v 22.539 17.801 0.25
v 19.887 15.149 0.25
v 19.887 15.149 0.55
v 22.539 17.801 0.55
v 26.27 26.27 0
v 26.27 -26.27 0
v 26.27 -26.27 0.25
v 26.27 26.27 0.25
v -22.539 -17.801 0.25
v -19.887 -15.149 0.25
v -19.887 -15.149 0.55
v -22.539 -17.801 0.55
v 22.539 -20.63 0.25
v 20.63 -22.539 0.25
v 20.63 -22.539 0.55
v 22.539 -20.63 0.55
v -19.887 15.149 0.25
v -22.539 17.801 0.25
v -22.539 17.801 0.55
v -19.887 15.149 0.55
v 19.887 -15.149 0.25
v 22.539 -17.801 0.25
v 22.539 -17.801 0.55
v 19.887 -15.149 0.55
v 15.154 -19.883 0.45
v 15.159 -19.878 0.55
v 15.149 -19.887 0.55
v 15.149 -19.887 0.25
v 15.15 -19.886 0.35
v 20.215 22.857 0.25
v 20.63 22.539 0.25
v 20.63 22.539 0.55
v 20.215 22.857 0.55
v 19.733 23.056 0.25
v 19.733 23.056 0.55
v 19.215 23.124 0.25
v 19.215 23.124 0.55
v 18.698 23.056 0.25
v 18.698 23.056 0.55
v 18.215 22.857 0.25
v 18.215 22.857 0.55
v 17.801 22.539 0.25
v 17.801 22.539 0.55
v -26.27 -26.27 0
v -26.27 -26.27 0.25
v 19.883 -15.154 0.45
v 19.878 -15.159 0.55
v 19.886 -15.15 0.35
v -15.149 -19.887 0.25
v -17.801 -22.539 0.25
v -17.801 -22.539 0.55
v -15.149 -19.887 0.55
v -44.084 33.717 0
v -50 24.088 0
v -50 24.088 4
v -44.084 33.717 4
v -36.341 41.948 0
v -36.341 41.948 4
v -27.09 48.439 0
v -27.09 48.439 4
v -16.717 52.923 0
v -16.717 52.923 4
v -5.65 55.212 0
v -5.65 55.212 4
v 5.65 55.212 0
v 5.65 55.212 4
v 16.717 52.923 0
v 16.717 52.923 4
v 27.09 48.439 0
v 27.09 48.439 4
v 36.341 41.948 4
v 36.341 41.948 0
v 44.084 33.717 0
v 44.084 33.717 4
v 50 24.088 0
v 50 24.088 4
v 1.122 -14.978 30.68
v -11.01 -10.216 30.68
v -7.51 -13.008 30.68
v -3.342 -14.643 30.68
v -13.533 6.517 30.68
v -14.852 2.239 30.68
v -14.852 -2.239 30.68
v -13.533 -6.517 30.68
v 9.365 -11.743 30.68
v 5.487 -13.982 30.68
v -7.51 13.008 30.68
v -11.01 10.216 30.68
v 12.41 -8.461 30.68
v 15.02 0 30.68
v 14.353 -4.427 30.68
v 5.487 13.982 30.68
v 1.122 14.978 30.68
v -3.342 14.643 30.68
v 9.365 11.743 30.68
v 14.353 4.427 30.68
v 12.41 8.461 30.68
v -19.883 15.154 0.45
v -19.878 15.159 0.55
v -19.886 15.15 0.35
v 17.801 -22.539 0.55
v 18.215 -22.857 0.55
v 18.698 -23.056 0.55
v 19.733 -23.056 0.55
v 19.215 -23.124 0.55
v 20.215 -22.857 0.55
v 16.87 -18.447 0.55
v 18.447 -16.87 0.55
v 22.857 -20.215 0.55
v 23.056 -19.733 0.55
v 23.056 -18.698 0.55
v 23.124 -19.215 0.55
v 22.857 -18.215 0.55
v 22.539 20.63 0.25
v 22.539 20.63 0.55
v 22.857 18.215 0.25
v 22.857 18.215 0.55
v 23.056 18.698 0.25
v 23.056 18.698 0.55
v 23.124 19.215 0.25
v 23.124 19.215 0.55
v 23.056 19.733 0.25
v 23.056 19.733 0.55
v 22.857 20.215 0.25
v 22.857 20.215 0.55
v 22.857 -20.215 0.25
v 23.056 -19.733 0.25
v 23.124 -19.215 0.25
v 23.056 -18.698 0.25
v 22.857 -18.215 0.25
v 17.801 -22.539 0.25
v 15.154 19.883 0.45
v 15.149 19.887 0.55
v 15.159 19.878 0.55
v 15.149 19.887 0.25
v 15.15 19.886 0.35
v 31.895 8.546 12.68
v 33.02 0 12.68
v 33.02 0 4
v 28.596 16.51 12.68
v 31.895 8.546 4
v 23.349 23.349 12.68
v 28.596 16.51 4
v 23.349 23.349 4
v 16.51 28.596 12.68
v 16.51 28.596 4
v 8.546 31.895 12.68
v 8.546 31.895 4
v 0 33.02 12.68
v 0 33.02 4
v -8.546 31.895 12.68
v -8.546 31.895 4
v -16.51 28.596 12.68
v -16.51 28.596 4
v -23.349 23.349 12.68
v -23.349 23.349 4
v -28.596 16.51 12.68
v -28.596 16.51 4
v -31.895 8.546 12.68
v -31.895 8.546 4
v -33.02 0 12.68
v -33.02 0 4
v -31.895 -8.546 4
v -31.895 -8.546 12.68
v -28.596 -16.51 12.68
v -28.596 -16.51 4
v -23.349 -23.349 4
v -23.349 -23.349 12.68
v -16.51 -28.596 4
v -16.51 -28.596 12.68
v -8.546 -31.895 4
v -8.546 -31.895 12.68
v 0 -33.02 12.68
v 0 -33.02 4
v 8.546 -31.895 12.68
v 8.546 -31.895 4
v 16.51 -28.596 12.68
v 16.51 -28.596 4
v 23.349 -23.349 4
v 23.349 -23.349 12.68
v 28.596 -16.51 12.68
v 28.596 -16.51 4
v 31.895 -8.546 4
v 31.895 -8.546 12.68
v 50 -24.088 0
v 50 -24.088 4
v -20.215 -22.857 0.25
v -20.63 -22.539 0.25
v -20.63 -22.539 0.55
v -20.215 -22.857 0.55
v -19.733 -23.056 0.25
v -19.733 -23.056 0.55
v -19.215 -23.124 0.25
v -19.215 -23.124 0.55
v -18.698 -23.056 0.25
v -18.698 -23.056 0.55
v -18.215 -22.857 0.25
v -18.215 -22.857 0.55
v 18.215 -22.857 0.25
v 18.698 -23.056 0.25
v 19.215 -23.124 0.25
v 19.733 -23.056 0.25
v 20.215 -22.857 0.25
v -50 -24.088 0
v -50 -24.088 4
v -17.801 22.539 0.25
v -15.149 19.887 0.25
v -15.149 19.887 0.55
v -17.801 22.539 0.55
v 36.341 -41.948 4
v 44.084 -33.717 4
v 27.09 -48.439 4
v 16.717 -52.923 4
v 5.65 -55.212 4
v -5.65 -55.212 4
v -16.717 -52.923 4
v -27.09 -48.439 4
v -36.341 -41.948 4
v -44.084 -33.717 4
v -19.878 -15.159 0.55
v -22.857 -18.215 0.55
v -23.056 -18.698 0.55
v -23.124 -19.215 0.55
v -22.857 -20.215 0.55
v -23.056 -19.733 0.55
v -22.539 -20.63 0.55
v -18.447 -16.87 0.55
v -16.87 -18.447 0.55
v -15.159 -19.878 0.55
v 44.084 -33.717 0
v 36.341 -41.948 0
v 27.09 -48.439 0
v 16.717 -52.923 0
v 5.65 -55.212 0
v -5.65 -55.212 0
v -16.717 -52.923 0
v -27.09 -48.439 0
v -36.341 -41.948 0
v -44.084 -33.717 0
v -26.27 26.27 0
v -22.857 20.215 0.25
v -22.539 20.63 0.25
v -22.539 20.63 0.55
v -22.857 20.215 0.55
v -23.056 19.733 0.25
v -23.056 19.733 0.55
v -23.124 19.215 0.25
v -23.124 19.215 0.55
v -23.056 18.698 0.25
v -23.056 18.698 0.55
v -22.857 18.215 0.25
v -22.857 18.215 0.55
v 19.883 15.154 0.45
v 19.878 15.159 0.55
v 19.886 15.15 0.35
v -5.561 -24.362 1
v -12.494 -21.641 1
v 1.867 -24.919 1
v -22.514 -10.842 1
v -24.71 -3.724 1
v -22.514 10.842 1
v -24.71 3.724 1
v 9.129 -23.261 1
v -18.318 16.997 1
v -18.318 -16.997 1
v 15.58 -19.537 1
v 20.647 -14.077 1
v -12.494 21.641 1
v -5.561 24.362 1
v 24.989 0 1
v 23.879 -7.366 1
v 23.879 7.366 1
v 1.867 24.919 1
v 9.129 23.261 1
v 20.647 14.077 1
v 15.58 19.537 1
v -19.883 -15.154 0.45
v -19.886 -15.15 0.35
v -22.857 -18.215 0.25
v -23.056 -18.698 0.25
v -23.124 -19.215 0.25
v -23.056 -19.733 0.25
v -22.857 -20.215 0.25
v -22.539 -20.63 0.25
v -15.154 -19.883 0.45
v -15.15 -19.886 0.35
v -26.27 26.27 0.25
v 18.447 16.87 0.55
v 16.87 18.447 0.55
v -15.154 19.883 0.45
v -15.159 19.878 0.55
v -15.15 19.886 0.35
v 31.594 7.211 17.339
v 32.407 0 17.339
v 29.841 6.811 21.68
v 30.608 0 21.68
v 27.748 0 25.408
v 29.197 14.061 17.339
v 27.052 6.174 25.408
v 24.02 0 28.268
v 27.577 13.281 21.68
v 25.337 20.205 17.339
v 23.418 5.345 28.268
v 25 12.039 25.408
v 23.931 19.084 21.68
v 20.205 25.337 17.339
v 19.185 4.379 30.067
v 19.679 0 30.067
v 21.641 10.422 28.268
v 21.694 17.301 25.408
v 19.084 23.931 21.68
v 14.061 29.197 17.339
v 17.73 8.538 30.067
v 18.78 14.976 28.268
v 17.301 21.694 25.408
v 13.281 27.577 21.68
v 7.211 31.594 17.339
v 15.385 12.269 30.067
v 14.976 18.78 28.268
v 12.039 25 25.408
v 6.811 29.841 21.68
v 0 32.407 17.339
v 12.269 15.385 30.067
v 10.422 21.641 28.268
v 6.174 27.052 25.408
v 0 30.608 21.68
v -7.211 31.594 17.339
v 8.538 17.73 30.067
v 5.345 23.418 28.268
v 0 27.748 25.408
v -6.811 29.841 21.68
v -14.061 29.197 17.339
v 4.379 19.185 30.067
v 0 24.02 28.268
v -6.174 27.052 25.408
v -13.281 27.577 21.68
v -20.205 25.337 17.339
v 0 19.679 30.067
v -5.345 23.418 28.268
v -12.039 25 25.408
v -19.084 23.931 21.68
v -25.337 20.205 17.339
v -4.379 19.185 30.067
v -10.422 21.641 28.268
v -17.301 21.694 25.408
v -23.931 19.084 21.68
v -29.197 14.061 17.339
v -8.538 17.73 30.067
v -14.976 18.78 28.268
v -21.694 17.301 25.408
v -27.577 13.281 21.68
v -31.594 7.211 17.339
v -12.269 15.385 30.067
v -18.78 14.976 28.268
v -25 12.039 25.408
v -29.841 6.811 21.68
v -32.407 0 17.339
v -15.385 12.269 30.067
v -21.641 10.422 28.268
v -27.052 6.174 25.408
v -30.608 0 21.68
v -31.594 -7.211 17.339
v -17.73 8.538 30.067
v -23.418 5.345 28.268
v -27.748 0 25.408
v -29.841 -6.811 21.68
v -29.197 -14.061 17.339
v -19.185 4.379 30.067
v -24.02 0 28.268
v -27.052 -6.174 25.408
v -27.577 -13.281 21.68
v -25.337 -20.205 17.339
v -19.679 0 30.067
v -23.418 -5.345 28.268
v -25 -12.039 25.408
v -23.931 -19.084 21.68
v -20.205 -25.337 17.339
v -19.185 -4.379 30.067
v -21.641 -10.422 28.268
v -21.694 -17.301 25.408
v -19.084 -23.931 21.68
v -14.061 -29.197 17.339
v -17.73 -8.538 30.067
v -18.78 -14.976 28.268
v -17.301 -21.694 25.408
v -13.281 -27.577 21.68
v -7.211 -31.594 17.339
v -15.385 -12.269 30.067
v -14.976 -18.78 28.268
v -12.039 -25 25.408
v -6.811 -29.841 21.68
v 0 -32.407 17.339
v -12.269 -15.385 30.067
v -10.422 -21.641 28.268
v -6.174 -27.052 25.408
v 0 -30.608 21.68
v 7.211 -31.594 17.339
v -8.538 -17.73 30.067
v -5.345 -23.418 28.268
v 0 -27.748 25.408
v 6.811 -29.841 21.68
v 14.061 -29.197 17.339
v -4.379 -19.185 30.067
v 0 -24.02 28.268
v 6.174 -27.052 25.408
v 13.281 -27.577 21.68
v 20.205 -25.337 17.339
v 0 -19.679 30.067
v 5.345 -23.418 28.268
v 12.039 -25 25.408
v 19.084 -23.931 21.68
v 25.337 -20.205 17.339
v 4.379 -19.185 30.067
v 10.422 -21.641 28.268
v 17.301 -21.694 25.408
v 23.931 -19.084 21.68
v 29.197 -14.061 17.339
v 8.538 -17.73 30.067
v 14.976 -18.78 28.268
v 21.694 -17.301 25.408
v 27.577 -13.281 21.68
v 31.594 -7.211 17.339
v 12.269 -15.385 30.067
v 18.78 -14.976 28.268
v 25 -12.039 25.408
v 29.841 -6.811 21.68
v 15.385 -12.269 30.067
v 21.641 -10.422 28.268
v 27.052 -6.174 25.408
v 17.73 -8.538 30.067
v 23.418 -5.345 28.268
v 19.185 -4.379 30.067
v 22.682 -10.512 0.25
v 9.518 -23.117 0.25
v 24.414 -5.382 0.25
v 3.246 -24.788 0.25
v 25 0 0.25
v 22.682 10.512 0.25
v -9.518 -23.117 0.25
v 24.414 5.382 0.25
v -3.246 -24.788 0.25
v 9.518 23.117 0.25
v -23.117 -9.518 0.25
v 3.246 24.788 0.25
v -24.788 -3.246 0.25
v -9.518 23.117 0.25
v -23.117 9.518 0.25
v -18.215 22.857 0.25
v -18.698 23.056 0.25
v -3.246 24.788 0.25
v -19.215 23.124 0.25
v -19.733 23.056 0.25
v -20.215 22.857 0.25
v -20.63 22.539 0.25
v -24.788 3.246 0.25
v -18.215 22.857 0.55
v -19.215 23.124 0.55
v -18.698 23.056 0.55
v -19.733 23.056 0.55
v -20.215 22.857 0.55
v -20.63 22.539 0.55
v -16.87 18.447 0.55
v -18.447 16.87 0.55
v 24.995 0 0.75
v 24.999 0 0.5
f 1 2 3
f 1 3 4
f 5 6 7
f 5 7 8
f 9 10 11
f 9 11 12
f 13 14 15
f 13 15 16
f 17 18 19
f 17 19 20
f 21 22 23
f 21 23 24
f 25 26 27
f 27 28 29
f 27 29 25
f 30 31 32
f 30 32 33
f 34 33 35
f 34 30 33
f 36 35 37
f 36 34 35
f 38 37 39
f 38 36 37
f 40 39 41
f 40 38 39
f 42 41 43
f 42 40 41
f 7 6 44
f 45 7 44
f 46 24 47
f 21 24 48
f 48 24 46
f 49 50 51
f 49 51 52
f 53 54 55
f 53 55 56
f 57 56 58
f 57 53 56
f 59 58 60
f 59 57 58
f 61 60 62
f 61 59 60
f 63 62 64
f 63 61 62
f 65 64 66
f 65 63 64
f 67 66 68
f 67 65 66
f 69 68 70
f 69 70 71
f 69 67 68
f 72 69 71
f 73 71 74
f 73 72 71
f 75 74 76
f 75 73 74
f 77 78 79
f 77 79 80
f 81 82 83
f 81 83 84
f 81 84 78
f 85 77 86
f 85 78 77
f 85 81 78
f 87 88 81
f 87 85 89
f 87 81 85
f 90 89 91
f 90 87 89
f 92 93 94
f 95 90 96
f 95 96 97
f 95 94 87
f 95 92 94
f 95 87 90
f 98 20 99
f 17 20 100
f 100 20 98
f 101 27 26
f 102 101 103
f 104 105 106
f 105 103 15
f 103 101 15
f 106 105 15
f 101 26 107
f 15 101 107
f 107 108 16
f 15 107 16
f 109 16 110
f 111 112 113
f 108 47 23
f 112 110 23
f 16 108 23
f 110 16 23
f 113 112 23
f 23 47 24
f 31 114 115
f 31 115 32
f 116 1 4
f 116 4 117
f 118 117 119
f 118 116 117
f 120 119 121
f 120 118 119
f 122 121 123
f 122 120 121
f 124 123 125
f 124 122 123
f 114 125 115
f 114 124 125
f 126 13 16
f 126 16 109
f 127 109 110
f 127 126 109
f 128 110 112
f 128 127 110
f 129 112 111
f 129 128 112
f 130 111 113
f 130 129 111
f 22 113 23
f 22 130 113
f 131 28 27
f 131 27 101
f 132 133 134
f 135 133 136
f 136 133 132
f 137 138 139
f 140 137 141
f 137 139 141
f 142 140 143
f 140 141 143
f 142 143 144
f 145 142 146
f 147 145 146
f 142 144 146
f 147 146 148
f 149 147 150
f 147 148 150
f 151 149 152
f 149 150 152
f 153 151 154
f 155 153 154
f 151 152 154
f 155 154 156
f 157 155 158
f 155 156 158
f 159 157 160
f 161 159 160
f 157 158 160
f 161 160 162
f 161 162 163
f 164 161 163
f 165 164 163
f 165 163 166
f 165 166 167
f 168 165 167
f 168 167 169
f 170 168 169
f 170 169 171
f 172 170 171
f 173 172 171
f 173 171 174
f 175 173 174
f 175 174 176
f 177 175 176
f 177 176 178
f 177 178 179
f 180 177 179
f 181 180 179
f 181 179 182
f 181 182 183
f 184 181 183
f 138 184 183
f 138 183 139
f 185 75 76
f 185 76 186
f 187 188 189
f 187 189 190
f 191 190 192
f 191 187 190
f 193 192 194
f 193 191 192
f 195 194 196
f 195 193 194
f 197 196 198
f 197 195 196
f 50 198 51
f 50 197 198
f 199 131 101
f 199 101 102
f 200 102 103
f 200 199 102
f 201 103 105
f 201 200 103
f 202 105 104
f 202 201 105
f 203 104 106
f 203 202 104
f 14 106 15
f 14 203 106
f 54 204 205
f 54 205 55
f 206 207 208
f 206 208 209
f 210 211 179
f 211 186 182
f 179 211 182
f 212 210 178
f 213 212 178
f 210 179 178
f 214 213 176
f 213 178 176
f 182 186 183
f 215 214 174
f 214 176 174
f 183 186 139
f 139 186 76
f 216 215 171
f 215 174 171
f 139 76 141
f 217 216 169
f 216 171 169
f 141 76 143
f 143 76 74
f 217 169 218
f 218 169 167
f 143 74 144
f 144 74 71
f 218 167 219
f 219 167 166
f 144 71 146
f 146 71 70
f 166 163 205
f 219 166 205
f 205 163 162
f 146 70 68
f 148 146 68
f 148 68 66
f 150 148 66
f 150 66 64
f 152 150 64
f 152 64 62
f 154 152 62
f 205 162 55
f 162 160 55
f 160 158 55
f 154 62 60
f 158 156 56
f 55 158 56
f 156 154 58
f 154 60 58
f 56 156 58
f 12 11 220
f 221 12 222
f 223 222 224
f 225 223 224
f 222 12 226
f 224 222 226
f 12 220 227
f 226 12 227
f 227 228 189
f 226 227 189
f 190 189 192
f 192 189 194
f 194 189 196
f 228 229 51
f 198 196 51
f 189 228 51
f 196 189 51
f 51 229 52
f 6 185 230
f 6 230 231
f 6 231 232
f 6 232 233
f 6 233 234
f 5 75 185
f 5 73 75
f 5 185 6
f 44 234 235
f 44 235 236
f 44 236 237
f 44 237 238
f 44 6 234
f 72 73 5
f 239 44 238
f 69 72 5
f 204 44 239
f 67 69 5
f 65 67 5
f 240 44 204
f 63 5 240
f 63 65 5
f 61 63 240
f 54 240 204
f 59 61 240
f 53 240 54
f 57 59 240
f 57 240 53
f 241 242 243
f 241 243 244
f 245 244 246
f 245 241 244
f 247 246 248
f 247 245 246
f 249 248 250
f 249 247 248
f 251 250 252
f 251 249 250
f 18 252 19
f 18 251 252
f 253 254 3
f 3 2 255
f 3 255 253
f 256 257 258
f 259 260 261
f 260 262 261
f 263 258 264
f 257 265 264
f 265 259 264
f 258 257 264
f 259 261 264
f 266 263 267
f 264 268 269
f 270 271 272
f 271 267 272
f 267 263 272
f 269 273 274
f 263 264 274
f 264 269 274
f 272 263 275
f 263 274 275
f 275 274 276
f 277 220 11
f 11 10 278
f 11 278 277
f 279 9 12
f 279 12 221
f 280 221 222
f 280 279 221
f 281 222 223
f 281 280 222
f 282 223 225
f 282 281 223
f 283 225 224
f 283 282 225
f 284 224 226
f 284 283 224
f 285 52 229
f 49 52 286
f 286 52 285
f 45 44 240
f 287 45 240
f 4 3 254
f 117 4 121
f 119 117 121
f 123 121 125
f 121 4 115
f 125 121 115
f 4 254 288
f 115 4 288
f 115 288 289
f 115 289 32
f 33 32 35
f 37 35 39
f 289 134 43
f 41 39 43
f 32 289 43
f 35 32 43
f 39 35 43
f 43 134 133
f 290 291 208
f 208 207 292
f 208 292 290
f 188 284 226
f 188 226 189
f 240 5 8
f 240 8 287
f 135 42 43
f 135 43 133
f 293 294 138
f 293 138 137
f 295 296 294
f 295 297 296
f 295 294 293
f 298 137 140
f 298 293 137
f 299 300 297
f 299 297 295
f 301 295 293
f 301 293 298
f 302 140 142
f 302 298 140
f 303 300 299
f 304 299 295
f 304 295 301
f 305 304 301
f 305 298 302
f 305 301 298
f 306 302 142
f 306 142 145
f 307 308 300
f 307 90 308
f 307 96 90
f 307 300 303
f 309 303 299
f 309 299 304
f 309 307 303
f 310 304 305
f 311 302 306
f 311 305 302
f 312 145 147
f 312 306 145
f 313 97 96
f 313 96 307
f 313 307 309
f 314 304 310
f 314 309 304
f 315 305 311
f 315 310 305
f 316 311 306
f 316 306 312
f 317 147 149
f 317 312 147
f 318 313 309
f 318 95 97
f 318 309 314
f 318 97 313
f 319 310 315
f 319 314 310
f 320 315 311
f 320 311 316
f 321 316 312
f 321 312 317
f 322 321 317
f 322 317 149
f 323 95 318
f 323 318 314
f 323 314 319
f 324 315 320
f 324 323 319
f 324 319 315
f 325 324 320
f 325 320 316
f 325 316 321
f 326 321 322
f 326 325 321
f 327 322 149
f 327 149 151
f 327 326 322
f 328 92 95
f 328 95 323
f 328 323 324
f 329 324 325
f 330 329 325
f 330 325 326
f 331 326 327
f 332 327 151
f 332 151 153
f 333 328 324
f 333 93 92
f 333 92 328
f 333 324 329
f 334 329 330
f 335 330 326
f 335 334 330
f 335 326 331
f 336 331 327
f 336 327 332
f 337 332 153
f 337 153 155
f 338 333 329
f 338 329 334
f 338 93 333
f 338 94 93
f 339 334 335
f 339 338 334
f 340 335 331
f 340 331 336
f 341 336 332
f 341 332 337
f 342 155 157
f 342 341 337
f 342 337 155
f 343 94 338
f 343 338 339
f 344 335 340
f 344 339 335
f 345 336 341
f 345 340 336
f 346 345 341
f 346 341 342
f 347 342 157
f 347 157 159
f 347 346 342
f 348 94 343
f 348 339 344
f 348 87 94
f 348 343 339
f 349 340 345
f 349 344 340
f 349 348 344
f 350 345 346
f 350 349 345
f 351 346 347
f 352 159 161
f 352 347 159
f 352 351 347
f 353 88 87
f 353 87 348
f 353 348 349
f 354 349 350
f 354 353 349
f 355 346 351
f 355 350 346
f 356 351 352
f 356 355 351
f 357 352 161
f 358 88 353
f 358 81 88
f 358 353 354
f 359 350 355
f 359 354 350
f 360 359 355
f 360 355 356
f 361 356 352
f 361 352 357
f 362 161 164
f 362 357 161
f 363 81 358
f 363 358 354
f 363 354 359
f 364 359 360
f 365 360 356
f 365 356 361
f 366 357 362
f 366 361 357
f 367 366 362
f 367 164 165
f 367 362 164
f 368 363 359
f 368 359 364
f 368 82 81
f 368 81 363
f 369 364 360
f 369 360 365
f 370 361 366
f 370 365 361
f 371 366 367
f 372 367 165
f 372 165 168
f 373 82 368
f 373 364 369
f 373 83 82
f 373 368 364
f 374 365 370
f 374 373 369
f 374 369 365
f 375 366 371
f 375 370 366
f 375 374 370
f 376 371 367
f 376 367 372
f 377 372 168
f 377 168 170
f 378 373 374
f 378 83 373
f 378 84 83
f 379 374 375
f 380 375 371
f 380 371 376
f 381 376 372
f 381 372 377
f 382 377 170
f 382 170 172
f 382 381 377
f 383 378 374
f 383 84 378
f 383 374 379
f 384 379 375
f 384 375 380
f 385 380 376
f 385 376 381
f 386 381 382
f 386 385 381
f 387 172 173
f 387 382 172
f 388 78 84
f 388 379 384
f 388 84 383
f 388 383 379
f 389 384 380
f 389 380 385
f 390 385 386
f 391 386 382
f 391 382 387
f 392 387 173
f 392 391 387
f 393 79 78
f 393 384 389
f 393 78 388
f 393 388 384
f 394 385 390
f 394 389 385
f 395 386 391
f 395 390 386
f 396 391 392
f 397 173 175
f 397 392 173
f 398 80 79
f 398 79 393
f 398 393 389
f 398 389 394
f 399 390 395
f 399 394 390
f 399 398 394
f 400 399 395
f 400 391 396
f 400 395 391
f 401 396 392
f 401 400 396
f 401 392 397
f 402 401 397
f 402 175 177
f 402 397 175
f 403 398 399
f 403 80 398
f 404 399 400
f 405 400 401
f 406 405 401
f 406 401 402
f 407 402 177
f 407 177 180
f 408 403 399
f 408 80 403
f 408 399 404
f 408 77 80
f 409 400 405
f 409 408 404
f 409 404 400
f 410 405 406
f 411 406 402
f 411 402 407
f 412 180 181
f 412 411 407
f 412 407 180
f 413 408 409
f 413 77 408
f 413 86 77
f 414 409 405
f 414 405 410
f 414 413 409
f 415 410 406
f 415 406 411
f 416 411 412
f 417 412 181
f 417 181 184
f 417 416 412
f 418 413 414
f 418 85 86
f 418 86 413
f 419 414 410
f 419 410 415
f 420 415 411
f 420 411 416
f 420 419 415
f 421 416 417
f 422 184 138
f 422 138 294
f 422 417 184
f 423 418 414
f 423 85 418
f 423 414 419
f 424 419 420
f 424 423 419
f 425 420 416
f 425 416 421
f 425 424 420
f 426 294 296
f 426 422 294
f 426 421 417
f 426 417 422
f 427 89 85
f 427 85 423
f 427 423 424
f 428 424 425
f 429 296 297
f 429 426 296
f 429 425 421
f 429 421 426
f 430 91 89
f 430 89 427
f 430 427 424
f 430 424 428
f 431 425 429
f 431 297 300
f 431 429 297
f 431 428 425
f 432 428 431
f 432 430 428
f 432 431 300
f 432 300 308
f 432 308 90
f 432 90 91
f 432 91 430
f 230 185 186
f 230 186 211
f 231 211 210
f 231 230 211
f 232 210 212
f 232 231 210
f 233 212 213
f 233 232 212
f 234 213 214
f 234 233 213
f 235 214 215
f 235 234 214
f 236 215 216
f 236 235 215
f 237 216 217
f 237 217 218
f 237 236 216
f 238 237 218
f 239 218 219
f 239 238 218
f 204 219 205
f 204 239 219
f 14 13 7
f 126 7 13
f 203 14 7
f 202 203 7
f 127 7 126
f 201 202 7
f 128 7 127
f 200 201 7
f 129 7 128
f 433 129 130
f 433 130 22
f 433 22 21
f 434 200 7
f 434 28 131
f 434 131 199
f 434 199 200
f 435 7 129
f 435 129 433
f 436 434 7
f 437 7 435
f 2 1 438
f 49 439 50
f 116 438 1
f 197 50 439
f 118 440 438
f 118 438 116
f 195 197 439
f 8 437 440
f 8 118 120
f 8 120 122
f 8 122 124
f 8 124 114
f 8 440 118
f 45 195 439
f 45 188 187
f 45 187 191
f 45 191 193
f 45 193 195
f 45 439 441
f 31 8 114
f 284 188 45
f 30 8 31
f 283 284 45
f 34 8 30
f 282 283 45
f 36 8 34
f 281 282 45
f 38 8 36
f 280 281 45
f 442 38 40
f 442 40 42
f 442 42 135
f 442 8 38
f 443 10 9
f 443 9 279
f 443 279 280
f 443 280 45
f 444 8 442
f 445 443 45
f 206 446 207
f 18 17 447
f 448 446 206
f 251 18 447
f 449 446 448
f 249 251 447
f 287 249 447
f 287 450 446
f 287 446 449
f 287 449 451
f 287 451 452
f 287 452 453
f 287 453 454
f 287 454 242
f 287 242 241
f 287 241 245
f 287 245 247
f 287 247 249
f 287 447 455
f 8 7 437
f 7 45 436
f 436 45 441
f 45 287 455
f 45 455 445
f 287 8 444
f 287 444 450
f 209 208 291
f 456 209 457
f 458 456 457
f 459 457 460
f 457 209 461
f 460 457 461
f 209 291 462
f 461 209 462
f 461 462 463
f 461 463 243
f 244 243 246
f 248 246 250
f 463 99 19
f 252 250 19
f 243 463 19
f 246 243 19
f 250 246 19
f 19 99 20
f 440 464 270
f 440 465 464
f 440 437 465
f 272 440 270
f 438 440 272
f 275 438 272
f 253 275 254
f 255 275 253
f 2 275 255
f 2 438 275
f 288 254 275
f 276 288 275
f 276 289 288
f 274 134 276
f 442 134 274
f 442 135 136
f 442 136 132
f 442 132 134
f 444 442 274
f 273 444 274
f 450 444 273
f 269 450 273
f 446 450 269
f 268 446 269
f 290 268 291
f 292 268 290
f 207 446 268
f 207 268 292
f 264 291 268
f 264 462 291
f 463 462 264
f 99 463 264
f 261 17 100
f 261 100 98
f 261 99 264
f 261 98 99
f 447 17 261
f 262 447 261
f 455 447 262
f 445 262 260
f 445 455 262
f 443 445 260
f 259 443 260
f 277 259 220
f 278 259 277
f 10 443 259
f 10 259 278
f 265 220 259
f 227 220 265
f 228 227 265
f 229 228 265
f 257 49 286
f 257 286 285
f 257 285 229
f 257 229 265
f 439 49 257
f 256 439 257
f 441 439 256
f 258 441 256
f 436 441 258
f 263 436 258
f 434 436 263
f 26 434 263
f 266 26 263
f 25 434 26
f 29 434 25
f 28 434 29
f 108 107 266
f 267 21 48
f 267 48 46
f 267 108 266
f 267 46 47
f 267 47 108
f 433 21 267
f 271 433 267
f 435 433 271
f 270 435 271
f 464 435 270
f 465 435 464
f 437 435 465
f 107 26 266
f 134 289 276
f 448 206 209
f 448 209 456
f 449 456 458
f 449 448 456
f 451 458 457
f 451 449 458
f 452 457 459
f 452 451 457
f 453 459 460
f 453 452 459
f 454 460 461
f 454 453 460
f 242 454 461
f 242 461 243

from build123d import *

# Parameters (mm, degrees)
BOSS_EXTRUDE1_DEPTH      = 4
SKETCH6_W                = 52.54
SKETCH6_H                = 52.54
CUT_EXTRUDE2_DEPTH       = 0.25
CUT_EXTRUDE3_DEPTH       = 0.3
CIRPATTERN1_COUNT        = 4
BOSS_EXTRUDE3_DEPTH      = 26.68
BOSS_EXTRUDE3_DEPTH_BACK = 3
SKETCH9_R                = 33.02
FILLET2_R                = 18


with BuildPart() as part:
    # Sketch1 → Boss-Extrude1 (new body)
    with BuildSketch(Plane.XY):
        with BuildLine():
            Line((50, 24.088378941), (50, -24.088378941))
            ThreePointArc((50, -24.088378941), (0, -55.5), (-50, -24.088378941))
            Line((-50, -24.088378941), (-50, 24.088378941))
            ThreePointArc((-50, 24.088378941), (0, 55.5), (50, 24.088378941))
        make_face()
    extrude(amount=BOSS_EXTRUDE1_DEPTH)

    # Sketch6 → Cut-Extrude2 (cut)
    with BuildSketch(Plane(origin=(0, 0, 0), x_dir=(-1, 0, 0), z_dir=(0, 0, -1))):
        Rectangle(SKETCH6_W, SKETCH6_H)
    extrude(amount=-CUT_EXTRUDE2_DEPTH, mode=Mode.SUBTRACT)

    # Sketch7 → Cut-Revolve1 (revolve, cut)
    with BuildSketch(Plane(origin=(0, 0, 0), x_dir=(1, 0, 0), z_dir=(0, 1, 0))):
        with BuildLine():
            Line((0, -0.25), (0, -25.25))
            ThreePointArc((0, -25.25), (17.67766953, -17.92766953), (25, -0.25))
            Line((25, -0.25), (0, -0.25))
        make_face()
    revolve(axis=Axis((0, 0, 0.25), (0, 0, 1)), mode=Mode.SUBTRACT)

    # Sketch8 → Cut-Extrude3 (cut)
    with BuildSketch(Plane(origin=(0, 0, 0.25), x_dir=(-1, 0, 0), z_dir=(0, 0, -1))):
        with BuildLine():
            Line((-19.887048211, -15.149432777), (-15.149432777, -19.887048211))
            Line((-15.149432777, -19.887048211), (-17.801083206, -22.53869864))
            ThreePointArc((-17.801083206, -22.53869864), (-19.215296769, -23.124485078), (-20.629510331, -22.53869864))
            Line((-20.629510331, -22.53869864), (-22.53869864, -20.629510331))
            ThreePointArc((-22.53869864, -20.629510331), (-23.124485078, -19.215296769), (-22.53869864, -17.801083206))
            Line((-22.53869864, -17.801083206), (-19.887048211, -15.149432777))
        make_face()
    cut_extrude3 = extrude(amount=-CUT_EXTRUDE3_DEPTH, mode=Mode.SUBTRACT)

    # CirPattern1: Cut-Extrude3 ×4 about axis
    cirpattern1_axis = Axis((0, 0, 0), (0, 0, 1))
    for i in range(1, CIRPATTERN1_COUNT):
        add(cut_extrude3.rotate(cirpattern1_axis, i * 360 / CIRPATTERN1_COUNT), mode=Mode.SUBTRACT)

    # Sketch9 → Boss-Extrude3 (add, two sides: drawn at the far end of the back side and taken through both)
    with BuildSketch(Plane.XY.offset(4).offset(-BOSS_EXTRUDE3_DEPTH_BACK)):
        Circle(SKETCH9_R)
    extrude(amount=BOSS_EXTRUDE3_DEPTH + BOSS_EXTRUDE3_DEPTH_BACK)

    # Fillet2
    fillet2_edges = [part.edges().sort_by_distance(p)[0] for p in [
        (-33.02, 0, 30.68),
    ]]
    fillet(fillet2_edges, radius=FILLET2_R)


solid = part.part
